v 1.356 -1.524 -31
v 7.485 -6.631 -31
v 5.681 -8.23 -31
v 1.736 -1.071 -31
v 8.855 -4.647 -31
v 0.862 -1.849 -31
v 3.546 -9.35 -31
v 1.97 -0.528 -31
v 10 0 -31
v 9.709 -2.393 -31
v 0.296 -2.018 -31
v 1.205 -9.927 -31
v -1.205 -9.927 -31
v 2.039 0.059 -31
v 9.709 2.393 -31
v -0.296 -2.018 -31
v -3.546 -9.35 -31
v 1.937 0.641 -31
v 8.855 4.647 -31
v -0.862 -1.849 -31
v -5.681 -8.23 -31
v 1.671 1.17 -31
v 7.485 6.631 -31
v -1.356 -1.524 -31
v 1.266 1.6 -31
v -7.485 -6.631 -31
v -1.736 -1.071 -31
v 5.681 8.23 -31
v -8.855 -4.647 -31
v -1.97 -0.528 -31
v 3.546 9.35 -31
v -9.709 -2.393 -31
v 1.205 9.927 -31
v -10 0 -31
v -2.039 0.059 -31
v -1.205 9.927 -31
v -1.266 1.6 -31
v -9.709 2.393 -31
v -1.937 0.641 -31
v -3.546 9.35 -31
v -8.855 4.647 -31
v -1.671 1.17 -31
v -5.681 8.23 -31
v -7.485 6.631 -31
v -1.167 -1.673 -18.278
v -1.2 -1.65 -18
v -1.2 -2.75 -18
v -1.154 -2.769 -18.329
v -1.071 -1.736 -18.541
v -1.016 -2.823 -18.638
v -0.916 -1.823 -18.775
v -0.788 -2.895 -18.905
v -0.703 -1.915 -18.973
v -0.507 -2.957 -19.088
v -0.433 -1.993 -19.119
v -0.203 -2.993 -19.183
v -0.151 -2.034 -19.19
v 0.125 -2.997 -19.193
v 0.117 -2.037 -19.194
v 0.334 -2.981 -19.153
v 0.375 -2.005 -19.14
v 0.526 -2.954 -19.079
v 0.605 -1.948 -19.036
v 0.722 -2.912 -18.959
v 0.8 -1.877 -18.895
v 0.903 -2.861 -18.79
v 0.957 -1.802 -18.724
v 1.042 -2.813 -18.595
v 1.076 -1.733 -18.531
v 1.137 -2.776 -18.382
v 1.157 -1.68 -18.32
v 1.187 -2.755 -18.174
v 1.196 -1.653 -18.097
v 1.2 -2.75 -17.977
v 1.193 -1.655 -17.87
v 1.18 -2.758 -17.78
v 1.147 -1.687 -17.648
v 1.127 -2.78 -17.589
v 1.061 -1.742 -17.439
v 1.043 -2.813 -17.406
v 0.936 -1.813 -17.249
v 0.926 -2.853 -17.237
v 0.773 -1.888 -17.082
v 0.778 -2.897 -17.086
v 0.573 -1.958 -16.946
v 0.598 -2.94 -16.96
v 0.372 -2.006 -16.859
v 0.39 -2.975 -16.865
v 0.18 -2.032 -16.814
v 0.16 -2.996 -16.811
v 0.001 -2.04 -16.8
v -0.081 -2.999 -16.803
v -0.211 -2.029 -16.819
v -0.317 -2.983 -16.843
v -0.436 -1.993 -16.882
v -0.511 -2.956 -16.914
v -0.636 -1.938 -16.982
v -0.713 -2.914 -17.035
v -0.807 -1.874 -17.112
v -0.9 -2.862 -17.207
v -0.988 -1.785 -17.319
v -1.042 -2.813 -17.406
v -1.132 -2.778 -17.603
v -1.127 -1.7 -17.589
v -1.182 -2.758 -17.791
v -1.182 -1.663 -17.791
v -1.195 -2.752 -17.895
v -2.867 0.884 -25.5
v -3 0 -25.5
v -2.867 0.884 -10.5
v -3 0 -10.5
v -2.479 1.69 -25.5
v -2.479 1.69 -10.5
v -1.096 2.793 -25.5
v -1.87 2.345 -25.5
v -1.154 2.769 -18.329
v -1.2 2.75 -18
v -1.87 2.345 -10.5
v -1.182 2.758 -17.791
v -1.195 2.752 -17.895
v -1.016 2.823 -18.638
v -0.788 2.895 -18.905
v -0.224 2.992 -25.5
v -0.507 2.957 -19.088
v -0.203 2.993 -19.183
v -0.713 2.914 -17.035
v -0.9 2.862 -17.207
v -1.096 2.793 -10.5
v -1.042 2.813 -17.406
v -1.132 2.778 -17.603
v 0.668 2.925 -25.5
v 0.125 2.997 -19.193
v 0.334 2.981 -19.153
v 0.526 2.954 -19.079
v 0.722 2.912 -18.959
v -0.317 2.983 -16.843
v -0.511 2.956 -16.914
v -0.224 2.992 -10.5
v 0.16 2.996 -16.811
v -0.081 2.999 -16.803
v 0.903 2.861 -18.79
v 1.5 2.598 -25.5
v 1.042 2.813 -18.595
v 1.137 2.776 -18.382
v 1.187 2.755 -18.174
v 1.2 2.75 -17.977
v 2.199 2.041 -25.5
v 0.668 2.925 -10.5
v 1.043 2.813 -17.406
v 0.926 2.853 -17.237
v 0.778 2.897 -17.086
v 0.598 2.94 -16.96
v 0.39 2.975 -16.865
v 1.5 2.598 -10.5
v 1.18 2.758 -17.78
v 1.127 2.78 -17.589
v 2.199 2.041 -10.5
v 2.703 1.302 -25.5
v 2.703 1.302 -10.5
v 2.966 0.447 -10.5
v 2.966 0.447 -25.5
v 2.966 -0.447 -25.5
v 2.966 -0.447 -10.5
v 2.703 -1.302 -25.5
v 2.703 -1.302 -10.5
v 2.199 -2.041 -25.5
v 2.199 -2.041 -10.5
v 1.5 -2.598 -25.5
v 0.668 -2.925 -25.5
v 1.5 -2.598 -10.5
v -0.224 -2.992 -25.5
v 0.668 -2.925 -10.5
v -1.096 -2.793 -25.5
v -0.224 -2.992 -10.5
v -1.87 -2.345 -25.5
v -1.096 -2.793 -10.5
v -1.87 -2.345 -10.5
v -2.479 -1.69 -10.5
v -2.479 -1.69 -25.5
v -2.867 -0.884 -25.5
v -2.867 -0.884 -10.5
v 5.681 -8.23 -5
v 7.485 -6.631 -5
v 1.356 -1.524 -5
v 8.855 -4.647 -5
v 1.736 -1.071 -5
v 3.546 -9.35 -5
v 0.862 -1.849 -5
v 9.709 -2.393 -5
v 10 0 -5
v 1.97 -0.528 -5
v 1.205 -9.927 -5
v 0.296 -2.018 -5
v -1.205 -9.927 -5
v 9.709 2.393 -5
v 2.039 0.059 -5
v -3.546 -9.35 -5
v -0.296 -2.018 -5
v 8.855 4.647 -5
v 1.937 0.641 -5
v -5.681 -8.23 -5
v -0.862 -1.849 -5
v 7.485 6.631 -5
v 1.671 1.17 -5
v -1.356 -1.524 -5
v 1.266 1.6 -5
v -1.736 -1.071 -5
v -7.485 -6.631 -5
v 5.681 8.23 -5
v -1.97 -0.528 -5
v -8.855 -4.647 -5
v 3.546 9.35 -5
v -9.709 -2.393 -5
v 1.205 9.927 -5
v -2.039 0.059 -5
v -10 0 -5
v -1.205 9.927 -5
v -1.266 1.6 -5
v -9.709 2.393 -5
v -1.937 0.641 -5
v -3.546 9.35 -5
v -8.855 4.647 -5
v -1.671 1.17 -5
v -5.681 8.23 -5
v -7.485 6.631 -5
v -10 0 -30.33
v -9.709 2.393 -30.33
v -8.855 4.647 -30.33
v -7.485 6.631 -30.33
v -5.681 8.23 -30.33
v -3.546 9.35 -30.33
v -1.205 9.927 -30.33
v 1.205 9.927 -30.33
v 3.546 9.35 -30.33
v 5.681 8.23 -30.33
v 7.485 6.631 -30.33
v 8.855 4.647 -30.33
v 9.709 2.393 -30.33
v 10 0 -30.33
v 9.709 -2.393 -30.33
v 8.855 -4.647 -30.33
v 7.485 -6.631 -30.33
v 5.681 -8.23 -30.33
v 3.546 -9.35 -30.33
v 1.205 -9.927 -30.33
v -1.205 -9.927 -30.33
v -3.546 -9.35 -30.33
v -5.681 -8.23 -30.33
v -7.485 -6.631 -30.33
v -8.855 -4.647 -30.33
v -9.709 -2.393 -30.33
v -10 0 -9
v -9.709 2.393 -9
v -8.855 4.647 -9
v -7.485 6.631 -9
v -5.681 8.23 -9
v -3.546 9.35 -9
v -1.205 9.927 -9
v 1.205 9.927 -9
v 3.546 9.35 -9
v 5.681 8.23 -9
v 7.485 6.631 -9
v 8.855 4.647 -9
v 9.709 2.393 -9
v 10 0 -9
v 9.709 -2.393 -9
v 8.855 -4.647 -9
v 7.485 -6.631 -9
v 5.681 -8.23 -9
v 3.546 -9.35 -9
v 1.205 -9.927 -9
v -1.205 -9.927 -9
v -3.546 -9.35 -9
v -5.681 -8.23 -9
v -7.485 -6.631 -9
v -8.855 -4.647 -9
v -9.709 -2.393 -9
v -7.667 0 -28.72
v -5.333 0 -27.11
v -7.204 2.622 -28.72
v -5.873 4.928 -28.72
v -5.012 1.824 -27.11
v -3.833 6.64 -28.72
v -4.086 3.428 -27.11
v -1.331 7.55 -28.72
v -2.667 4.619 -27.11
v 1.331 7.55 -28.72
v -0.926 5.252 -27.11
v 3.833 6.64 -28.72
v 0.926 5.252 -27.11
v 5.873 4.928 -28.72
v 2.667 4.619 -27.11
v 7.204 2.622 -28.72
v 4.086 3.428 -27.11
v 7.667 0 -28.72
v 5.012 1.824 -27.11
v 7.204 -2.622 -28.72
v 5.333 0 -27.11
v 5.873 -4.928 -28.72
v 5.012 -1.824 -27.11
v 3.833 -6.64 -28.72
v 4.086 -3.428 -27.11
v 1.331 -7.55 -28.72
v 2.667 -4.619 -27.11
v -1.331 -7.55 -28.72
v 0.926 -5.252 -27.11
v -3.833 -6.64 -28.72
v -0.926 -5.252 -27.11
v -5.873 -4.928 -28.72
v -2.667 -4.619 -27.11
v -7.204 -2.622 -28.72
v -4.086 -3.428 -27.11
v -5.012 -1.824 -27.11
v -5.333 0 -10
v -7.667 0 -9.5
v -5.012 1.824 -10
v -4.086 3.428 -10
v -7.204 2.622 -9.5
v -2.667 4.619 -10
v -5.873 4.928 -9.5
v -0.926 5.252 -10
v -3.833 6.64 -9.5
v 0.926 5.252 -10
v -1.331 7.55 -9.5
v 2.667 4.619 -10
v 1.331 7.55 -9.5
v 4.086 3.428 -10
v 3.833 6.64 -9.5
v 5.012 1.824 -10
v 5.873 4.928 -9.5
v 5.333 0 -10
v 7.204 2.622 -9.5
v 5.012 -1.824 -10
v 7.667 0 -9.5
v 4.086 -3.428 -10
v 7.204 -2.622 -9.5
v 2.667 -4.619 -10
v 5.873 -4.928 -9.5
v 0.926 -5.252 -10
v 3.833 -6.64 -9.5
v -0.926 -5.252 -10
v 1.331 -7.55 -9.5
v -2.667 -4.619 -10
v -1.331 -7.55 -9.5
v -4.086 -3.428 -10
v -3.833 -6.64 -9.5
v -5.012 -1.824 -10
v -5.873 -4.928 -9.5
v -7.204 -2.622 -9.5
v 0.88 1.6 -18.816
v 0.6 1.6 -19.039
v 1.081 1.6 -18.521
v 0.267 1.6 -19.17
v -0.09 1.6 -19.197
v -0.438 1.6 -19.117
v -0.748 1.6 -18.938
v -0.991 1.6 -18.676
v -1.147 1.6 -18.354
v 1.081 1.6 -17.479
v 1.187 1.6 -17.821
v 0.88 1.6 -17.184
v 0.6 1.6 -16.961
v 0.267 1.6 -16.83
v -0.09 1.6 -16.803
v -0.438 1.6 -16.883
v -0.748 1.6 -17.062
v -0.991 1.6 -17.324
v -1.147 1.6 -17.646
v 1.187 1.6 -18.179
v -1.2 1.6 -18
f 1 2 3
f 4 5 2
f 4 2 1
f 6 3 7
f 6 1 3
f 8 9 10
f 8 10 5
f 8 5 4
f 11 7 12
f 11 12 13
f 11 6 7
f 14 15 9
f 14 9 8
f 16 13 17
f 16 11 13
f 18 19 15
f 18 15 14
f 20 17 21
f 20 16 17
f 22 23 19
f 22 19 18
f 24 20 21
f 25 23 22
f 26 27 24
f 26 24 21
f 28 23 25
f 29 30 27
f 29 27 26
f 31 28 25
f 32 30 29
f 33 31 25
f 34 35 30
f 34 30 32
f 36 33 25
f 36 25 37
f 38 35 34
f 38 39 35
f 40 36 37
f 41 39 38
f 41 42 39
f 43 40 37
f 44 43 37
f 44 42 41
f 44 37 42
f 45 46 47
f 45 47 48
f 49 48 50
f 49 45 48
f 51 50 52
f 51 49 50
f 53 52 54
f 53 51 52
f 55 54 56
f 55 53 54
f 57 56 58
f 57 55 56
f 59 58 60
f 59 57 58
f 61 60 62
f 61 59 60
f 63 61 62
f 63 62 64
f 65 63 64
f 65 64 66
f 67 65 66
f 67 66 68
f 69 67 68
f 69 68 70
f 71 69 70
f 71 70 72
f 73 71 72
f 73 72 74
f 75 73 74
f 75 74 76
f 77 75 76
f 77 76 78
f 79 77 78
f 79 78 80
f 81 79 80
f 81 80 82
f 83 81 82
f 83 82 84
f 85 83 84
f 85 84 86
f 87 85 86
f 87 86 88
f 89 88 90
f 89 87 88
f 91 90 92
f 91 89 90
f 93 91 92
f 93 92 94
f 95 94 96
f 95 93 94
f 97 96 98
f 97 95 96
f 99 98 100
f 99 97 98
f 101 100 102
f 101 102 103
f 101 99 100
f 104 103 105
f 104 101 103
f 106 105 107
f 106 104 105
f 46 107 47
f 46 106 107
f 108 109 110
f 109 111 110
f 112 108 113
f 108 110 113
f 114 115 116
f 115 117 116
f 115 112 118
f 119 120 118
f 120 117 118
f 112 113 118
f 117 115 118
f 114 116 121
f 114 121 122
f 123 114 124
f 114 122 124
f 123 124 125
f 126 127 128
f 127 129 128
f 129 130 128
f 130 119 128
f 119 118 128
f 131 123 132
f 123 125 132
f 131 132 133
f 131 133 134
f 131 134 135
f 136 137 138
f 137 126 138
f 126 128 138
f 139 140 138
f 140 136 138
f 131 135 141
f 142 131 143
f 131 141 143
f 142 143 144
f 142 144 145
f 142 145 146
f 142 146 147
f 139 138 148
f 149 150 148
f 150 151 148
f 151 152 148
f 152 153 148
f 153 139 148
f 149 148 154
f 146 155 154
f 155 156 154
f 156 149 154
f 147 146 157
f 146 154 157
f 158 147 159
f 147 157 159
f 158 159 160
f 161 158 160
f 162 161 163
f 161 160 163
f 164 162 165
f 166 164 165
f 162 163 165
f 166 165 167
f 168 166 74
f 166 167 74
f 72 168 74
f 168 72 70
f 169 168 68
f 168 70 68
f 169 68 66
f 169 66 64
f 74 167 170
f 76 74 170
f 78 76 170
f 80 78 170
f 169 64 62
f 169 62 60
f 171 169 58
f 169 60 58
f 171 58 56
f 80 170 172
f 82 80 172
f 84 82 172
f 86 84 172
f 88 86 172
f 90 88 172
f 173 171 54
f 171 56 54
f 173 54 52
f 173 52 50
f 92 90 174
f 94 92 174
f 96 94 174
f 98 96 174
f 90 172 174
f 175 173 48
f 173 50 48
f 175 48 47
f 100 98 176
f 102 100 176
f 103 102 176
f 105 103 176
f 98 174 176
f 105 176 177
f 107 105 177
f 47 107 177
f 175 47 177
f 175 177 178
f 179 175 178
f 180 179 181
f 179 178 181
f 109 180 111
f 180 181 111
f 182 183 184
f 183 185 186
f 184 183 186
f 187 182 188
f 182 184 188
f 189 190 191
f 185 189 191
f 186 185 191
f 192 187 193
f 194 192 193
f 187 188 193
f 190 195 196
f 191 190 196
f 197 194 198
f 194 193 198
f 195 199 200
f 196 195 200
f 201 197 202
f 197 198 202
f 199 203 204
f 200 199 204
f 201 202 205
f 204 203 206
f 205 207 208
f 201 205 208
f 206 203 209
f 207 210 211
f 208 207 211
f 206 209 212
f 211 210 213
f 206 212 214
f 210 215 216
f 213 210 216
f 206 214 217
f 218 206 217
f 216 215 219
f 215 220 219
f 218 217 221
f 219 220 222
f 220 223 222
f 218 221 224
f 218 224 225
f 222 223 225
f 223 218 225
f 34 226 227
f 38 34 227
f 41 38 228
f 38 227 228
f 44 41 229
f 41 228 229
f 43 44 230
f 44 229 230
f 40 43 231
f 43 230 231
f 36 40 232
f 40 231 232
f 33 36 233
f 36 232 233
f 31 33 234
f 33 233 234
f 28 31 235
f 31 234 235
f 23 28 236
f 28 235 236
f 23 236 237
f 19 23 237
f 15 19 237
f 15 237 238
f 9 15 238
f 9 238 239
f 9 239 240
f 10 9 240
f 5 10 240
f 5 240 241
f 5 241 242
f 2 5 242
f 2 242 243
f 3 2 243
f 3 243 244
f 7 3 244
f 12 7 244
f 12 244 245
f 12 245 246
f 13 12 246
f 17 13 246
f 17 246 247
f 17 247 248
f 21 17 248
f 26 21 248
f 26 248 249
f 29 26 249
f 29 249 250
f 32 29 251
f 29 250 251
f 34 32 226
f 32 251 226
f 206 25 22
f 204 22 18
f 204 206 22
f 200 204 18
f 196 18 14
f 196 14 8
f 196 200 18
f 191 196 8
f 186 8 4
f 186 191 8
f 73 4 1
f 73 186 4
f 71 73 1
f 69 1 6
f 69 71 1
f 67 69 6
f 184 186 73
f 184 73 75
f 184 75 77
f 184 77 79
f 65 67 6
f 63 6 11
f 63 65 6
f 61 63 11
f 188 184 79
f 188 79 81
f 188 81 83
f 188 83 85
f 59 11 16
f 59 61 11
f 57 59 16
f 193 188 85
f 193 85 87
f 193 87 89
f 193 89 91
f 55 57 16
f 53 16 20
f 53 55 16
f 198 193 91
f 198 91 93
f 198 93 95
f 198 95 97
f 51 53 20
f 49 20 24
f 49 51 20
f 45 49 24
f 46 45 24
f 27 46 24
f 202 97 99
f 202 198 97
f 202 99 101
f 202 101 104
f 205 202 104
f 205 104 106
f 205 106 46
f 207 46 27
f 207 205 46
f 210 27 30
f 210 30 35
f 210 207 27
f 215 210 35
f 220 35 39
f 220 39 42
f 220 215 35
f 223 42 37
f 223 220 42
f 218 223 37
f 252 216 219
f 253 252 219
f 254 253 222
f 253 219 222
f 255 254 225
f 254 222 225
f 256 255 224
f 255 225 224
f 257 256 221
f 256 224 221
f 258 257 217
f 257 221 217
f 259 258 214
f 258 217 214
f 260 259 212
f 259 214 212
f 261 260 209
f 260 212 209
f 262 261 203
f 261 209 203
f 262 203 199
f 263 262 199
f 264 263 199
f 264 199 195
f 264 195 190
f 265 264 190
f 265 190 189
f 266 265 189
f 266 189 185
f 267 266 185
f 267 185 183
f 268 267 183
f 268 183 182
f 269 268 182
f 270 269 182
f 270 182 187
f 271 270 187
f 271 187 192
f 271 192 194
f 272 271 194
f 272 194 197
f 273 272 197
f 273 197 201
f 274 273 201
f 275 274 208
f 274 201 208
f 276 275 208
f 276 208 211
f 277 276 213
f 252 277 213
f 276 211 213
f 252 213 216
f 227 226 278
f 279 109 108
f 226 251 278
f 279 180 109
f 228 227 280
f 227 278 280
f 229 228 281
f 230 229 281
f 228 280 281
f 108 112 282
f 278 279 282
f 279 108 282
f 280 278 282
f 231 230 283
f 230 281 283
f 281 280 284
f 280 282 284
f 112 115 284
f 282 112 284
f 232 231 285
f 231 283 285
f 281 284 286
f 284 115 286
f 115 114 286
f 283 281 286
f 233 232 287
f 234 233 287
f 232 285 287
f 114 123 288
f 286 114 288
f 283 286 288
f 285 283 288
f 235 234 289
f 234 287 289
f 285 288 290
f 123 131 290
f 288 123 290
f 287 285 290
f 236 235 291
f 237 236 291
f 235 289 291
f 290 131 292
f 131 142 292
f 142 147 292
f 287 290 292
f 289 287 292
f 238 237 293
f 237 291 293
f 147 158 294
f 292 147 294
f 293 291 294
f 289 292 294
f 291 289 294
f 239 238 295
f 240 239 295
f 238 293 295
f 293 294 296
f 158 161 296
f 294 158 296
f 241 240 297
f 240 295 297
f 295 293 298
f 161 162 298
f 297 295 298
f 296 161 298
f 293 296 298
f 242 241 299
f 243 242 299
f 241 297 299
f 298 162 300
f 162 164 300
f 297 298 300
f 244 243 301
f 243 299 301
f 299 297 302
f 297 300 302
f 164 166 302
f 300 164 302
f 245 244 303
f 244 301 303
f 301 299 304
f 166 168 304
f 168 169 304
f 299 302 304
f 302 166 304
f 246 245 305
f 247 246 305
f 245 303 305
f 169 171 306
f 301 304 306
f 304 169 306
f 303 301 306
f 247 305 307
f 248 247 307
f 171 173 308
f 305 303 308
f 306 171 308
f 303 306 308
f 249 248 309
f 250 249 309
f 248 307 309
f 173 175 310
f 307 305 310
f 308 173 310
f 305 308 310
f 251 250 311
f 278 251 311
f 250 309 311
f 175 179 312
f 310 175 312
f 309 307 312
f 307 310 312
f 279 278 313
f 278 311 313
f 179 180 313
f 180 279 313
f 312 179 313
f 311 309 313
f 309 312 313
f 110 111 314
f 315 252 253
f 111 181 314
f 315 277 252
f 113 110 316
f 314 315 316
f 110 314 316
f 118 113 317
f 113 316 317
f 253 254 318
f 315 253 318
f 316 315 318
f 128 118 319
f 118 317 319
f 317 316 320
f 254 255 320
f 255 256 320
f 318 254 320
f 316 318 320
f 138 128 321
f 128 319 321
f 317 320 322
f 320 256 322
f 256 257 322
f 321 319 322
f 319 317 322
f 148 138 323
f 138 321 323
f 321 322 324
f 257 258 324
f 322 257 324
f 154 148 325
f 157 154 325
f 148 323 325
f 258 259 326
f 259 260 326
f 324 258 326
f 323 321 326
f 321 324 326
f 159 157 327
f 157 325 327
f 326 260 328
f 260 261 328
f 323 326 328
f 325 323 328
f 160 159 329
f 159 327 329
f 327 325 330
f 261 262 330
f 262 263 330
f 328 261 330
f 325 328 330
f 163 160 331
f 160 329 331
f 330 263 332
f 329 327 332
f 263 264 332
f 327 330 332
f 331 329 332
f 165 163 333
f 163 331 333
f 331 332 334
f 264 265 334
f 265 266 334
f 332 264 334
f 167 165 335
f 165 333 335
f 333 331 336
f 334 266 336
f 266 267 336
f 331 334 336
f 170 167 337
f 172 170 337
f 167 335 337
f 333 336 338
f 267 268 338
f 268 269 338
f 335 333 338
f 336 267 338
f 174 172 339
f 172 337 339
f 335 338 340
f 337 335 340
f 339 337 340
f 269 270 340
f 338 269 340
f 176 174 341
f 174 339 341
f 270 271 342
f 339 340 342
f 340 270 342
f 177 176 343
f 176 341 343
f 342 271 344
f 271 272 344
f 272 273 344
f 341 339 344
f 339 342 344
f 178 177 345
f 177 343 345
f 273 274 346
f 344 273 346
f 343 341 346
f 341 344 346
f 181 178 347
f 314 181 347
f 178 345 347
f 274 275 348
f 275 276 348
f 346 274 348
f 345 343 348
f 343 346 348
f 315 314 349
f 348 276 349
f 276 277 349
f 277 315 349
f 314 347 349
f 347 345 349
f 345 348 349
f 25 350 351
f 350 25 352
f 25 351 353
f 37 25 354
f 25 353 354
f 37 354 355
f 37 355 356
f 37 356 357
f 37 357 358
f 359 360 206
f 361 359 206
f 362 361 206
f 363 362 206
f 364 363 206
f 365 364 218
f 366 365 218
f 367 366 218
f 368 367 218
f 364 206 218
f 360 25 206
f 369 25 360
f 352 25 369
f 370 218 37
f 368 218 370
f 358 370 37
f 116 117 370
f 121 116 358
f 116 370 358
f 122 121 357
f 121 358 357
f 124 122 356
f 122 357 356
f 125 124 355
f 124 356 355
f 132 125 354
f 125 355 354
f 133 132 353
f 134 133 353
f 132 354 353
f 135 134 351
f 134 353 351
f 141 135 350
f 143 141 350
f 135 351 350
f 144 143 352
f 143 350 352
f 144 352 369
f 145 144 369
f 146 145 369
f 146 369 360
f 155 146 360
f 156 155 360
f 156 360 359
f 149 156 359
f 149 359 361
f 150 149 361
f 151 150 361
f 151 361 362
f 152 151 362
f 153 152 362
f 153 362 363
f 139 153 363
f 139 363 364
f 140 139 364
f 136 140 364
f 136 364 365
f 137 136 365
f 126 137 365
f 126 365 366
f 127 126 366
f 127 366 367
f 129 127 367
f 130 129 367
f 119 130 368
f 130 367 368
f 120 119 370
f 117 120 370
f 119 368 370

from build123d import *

# Parameters (mm, degrees)
SKETCH_R             = 10
PAD_DEPTH            = 26
SKETCH006_R          = 1.2
POCKET_DEPTH         = 10.001
POCKET_DEPTH_BACK    = 10.001
BODY_PLACEMENT_ANGLE = 180


with BuildPart() as part:
    # Sketch → Pad (new body)
    with BuildSketch(Plane.XY):
        Circle(SKETCH_R)
        with BuildLine():
            ThreePointArc((-1.265543, 1.6), (0, -2.04), (1.265543, 1.6))
            Line((-1.265543, 1.6), (1.265543, 1.6))
        make_face(mode=Mode.SUBTRACT)
    extrude(amount=PAD_DEPTH)

    # Sketch001 → Groove (revolve, cut)
    with BuildSketch(Plane.XZ):
        Polygon((10, 25.33014), (3, 20.5), (3, 5.5), (10, 4), align=None)
    revolve(axis=Axis((0, 0, 0), (0, 0, 1)), mode=Mode.SUBTRACT)

    # Sketch006 → Pocket (cut, two sides)
    with BuildSketch(Plane.XZ) as pocket_sk:
        with Locations((0, 13)):
            Circle(SKETCH006_R)
    extrude(amount=-POCKET_DEPTH, mode=Mode.SUBTRACT)
    extrude(pocket_sk.sketch, amount=POCKET_DEPTH_BACK, mode=Mode.SUBTRACT)


with BuildPart() as part_1:
    # Body placement: moved
    add(part.part.moved(Location((0, 0, -5))).rotate(Axis((0, 0, -5), (0, 1, 0)), BODY_PLACEMENT_ANGLE))


solid = part_1.part
